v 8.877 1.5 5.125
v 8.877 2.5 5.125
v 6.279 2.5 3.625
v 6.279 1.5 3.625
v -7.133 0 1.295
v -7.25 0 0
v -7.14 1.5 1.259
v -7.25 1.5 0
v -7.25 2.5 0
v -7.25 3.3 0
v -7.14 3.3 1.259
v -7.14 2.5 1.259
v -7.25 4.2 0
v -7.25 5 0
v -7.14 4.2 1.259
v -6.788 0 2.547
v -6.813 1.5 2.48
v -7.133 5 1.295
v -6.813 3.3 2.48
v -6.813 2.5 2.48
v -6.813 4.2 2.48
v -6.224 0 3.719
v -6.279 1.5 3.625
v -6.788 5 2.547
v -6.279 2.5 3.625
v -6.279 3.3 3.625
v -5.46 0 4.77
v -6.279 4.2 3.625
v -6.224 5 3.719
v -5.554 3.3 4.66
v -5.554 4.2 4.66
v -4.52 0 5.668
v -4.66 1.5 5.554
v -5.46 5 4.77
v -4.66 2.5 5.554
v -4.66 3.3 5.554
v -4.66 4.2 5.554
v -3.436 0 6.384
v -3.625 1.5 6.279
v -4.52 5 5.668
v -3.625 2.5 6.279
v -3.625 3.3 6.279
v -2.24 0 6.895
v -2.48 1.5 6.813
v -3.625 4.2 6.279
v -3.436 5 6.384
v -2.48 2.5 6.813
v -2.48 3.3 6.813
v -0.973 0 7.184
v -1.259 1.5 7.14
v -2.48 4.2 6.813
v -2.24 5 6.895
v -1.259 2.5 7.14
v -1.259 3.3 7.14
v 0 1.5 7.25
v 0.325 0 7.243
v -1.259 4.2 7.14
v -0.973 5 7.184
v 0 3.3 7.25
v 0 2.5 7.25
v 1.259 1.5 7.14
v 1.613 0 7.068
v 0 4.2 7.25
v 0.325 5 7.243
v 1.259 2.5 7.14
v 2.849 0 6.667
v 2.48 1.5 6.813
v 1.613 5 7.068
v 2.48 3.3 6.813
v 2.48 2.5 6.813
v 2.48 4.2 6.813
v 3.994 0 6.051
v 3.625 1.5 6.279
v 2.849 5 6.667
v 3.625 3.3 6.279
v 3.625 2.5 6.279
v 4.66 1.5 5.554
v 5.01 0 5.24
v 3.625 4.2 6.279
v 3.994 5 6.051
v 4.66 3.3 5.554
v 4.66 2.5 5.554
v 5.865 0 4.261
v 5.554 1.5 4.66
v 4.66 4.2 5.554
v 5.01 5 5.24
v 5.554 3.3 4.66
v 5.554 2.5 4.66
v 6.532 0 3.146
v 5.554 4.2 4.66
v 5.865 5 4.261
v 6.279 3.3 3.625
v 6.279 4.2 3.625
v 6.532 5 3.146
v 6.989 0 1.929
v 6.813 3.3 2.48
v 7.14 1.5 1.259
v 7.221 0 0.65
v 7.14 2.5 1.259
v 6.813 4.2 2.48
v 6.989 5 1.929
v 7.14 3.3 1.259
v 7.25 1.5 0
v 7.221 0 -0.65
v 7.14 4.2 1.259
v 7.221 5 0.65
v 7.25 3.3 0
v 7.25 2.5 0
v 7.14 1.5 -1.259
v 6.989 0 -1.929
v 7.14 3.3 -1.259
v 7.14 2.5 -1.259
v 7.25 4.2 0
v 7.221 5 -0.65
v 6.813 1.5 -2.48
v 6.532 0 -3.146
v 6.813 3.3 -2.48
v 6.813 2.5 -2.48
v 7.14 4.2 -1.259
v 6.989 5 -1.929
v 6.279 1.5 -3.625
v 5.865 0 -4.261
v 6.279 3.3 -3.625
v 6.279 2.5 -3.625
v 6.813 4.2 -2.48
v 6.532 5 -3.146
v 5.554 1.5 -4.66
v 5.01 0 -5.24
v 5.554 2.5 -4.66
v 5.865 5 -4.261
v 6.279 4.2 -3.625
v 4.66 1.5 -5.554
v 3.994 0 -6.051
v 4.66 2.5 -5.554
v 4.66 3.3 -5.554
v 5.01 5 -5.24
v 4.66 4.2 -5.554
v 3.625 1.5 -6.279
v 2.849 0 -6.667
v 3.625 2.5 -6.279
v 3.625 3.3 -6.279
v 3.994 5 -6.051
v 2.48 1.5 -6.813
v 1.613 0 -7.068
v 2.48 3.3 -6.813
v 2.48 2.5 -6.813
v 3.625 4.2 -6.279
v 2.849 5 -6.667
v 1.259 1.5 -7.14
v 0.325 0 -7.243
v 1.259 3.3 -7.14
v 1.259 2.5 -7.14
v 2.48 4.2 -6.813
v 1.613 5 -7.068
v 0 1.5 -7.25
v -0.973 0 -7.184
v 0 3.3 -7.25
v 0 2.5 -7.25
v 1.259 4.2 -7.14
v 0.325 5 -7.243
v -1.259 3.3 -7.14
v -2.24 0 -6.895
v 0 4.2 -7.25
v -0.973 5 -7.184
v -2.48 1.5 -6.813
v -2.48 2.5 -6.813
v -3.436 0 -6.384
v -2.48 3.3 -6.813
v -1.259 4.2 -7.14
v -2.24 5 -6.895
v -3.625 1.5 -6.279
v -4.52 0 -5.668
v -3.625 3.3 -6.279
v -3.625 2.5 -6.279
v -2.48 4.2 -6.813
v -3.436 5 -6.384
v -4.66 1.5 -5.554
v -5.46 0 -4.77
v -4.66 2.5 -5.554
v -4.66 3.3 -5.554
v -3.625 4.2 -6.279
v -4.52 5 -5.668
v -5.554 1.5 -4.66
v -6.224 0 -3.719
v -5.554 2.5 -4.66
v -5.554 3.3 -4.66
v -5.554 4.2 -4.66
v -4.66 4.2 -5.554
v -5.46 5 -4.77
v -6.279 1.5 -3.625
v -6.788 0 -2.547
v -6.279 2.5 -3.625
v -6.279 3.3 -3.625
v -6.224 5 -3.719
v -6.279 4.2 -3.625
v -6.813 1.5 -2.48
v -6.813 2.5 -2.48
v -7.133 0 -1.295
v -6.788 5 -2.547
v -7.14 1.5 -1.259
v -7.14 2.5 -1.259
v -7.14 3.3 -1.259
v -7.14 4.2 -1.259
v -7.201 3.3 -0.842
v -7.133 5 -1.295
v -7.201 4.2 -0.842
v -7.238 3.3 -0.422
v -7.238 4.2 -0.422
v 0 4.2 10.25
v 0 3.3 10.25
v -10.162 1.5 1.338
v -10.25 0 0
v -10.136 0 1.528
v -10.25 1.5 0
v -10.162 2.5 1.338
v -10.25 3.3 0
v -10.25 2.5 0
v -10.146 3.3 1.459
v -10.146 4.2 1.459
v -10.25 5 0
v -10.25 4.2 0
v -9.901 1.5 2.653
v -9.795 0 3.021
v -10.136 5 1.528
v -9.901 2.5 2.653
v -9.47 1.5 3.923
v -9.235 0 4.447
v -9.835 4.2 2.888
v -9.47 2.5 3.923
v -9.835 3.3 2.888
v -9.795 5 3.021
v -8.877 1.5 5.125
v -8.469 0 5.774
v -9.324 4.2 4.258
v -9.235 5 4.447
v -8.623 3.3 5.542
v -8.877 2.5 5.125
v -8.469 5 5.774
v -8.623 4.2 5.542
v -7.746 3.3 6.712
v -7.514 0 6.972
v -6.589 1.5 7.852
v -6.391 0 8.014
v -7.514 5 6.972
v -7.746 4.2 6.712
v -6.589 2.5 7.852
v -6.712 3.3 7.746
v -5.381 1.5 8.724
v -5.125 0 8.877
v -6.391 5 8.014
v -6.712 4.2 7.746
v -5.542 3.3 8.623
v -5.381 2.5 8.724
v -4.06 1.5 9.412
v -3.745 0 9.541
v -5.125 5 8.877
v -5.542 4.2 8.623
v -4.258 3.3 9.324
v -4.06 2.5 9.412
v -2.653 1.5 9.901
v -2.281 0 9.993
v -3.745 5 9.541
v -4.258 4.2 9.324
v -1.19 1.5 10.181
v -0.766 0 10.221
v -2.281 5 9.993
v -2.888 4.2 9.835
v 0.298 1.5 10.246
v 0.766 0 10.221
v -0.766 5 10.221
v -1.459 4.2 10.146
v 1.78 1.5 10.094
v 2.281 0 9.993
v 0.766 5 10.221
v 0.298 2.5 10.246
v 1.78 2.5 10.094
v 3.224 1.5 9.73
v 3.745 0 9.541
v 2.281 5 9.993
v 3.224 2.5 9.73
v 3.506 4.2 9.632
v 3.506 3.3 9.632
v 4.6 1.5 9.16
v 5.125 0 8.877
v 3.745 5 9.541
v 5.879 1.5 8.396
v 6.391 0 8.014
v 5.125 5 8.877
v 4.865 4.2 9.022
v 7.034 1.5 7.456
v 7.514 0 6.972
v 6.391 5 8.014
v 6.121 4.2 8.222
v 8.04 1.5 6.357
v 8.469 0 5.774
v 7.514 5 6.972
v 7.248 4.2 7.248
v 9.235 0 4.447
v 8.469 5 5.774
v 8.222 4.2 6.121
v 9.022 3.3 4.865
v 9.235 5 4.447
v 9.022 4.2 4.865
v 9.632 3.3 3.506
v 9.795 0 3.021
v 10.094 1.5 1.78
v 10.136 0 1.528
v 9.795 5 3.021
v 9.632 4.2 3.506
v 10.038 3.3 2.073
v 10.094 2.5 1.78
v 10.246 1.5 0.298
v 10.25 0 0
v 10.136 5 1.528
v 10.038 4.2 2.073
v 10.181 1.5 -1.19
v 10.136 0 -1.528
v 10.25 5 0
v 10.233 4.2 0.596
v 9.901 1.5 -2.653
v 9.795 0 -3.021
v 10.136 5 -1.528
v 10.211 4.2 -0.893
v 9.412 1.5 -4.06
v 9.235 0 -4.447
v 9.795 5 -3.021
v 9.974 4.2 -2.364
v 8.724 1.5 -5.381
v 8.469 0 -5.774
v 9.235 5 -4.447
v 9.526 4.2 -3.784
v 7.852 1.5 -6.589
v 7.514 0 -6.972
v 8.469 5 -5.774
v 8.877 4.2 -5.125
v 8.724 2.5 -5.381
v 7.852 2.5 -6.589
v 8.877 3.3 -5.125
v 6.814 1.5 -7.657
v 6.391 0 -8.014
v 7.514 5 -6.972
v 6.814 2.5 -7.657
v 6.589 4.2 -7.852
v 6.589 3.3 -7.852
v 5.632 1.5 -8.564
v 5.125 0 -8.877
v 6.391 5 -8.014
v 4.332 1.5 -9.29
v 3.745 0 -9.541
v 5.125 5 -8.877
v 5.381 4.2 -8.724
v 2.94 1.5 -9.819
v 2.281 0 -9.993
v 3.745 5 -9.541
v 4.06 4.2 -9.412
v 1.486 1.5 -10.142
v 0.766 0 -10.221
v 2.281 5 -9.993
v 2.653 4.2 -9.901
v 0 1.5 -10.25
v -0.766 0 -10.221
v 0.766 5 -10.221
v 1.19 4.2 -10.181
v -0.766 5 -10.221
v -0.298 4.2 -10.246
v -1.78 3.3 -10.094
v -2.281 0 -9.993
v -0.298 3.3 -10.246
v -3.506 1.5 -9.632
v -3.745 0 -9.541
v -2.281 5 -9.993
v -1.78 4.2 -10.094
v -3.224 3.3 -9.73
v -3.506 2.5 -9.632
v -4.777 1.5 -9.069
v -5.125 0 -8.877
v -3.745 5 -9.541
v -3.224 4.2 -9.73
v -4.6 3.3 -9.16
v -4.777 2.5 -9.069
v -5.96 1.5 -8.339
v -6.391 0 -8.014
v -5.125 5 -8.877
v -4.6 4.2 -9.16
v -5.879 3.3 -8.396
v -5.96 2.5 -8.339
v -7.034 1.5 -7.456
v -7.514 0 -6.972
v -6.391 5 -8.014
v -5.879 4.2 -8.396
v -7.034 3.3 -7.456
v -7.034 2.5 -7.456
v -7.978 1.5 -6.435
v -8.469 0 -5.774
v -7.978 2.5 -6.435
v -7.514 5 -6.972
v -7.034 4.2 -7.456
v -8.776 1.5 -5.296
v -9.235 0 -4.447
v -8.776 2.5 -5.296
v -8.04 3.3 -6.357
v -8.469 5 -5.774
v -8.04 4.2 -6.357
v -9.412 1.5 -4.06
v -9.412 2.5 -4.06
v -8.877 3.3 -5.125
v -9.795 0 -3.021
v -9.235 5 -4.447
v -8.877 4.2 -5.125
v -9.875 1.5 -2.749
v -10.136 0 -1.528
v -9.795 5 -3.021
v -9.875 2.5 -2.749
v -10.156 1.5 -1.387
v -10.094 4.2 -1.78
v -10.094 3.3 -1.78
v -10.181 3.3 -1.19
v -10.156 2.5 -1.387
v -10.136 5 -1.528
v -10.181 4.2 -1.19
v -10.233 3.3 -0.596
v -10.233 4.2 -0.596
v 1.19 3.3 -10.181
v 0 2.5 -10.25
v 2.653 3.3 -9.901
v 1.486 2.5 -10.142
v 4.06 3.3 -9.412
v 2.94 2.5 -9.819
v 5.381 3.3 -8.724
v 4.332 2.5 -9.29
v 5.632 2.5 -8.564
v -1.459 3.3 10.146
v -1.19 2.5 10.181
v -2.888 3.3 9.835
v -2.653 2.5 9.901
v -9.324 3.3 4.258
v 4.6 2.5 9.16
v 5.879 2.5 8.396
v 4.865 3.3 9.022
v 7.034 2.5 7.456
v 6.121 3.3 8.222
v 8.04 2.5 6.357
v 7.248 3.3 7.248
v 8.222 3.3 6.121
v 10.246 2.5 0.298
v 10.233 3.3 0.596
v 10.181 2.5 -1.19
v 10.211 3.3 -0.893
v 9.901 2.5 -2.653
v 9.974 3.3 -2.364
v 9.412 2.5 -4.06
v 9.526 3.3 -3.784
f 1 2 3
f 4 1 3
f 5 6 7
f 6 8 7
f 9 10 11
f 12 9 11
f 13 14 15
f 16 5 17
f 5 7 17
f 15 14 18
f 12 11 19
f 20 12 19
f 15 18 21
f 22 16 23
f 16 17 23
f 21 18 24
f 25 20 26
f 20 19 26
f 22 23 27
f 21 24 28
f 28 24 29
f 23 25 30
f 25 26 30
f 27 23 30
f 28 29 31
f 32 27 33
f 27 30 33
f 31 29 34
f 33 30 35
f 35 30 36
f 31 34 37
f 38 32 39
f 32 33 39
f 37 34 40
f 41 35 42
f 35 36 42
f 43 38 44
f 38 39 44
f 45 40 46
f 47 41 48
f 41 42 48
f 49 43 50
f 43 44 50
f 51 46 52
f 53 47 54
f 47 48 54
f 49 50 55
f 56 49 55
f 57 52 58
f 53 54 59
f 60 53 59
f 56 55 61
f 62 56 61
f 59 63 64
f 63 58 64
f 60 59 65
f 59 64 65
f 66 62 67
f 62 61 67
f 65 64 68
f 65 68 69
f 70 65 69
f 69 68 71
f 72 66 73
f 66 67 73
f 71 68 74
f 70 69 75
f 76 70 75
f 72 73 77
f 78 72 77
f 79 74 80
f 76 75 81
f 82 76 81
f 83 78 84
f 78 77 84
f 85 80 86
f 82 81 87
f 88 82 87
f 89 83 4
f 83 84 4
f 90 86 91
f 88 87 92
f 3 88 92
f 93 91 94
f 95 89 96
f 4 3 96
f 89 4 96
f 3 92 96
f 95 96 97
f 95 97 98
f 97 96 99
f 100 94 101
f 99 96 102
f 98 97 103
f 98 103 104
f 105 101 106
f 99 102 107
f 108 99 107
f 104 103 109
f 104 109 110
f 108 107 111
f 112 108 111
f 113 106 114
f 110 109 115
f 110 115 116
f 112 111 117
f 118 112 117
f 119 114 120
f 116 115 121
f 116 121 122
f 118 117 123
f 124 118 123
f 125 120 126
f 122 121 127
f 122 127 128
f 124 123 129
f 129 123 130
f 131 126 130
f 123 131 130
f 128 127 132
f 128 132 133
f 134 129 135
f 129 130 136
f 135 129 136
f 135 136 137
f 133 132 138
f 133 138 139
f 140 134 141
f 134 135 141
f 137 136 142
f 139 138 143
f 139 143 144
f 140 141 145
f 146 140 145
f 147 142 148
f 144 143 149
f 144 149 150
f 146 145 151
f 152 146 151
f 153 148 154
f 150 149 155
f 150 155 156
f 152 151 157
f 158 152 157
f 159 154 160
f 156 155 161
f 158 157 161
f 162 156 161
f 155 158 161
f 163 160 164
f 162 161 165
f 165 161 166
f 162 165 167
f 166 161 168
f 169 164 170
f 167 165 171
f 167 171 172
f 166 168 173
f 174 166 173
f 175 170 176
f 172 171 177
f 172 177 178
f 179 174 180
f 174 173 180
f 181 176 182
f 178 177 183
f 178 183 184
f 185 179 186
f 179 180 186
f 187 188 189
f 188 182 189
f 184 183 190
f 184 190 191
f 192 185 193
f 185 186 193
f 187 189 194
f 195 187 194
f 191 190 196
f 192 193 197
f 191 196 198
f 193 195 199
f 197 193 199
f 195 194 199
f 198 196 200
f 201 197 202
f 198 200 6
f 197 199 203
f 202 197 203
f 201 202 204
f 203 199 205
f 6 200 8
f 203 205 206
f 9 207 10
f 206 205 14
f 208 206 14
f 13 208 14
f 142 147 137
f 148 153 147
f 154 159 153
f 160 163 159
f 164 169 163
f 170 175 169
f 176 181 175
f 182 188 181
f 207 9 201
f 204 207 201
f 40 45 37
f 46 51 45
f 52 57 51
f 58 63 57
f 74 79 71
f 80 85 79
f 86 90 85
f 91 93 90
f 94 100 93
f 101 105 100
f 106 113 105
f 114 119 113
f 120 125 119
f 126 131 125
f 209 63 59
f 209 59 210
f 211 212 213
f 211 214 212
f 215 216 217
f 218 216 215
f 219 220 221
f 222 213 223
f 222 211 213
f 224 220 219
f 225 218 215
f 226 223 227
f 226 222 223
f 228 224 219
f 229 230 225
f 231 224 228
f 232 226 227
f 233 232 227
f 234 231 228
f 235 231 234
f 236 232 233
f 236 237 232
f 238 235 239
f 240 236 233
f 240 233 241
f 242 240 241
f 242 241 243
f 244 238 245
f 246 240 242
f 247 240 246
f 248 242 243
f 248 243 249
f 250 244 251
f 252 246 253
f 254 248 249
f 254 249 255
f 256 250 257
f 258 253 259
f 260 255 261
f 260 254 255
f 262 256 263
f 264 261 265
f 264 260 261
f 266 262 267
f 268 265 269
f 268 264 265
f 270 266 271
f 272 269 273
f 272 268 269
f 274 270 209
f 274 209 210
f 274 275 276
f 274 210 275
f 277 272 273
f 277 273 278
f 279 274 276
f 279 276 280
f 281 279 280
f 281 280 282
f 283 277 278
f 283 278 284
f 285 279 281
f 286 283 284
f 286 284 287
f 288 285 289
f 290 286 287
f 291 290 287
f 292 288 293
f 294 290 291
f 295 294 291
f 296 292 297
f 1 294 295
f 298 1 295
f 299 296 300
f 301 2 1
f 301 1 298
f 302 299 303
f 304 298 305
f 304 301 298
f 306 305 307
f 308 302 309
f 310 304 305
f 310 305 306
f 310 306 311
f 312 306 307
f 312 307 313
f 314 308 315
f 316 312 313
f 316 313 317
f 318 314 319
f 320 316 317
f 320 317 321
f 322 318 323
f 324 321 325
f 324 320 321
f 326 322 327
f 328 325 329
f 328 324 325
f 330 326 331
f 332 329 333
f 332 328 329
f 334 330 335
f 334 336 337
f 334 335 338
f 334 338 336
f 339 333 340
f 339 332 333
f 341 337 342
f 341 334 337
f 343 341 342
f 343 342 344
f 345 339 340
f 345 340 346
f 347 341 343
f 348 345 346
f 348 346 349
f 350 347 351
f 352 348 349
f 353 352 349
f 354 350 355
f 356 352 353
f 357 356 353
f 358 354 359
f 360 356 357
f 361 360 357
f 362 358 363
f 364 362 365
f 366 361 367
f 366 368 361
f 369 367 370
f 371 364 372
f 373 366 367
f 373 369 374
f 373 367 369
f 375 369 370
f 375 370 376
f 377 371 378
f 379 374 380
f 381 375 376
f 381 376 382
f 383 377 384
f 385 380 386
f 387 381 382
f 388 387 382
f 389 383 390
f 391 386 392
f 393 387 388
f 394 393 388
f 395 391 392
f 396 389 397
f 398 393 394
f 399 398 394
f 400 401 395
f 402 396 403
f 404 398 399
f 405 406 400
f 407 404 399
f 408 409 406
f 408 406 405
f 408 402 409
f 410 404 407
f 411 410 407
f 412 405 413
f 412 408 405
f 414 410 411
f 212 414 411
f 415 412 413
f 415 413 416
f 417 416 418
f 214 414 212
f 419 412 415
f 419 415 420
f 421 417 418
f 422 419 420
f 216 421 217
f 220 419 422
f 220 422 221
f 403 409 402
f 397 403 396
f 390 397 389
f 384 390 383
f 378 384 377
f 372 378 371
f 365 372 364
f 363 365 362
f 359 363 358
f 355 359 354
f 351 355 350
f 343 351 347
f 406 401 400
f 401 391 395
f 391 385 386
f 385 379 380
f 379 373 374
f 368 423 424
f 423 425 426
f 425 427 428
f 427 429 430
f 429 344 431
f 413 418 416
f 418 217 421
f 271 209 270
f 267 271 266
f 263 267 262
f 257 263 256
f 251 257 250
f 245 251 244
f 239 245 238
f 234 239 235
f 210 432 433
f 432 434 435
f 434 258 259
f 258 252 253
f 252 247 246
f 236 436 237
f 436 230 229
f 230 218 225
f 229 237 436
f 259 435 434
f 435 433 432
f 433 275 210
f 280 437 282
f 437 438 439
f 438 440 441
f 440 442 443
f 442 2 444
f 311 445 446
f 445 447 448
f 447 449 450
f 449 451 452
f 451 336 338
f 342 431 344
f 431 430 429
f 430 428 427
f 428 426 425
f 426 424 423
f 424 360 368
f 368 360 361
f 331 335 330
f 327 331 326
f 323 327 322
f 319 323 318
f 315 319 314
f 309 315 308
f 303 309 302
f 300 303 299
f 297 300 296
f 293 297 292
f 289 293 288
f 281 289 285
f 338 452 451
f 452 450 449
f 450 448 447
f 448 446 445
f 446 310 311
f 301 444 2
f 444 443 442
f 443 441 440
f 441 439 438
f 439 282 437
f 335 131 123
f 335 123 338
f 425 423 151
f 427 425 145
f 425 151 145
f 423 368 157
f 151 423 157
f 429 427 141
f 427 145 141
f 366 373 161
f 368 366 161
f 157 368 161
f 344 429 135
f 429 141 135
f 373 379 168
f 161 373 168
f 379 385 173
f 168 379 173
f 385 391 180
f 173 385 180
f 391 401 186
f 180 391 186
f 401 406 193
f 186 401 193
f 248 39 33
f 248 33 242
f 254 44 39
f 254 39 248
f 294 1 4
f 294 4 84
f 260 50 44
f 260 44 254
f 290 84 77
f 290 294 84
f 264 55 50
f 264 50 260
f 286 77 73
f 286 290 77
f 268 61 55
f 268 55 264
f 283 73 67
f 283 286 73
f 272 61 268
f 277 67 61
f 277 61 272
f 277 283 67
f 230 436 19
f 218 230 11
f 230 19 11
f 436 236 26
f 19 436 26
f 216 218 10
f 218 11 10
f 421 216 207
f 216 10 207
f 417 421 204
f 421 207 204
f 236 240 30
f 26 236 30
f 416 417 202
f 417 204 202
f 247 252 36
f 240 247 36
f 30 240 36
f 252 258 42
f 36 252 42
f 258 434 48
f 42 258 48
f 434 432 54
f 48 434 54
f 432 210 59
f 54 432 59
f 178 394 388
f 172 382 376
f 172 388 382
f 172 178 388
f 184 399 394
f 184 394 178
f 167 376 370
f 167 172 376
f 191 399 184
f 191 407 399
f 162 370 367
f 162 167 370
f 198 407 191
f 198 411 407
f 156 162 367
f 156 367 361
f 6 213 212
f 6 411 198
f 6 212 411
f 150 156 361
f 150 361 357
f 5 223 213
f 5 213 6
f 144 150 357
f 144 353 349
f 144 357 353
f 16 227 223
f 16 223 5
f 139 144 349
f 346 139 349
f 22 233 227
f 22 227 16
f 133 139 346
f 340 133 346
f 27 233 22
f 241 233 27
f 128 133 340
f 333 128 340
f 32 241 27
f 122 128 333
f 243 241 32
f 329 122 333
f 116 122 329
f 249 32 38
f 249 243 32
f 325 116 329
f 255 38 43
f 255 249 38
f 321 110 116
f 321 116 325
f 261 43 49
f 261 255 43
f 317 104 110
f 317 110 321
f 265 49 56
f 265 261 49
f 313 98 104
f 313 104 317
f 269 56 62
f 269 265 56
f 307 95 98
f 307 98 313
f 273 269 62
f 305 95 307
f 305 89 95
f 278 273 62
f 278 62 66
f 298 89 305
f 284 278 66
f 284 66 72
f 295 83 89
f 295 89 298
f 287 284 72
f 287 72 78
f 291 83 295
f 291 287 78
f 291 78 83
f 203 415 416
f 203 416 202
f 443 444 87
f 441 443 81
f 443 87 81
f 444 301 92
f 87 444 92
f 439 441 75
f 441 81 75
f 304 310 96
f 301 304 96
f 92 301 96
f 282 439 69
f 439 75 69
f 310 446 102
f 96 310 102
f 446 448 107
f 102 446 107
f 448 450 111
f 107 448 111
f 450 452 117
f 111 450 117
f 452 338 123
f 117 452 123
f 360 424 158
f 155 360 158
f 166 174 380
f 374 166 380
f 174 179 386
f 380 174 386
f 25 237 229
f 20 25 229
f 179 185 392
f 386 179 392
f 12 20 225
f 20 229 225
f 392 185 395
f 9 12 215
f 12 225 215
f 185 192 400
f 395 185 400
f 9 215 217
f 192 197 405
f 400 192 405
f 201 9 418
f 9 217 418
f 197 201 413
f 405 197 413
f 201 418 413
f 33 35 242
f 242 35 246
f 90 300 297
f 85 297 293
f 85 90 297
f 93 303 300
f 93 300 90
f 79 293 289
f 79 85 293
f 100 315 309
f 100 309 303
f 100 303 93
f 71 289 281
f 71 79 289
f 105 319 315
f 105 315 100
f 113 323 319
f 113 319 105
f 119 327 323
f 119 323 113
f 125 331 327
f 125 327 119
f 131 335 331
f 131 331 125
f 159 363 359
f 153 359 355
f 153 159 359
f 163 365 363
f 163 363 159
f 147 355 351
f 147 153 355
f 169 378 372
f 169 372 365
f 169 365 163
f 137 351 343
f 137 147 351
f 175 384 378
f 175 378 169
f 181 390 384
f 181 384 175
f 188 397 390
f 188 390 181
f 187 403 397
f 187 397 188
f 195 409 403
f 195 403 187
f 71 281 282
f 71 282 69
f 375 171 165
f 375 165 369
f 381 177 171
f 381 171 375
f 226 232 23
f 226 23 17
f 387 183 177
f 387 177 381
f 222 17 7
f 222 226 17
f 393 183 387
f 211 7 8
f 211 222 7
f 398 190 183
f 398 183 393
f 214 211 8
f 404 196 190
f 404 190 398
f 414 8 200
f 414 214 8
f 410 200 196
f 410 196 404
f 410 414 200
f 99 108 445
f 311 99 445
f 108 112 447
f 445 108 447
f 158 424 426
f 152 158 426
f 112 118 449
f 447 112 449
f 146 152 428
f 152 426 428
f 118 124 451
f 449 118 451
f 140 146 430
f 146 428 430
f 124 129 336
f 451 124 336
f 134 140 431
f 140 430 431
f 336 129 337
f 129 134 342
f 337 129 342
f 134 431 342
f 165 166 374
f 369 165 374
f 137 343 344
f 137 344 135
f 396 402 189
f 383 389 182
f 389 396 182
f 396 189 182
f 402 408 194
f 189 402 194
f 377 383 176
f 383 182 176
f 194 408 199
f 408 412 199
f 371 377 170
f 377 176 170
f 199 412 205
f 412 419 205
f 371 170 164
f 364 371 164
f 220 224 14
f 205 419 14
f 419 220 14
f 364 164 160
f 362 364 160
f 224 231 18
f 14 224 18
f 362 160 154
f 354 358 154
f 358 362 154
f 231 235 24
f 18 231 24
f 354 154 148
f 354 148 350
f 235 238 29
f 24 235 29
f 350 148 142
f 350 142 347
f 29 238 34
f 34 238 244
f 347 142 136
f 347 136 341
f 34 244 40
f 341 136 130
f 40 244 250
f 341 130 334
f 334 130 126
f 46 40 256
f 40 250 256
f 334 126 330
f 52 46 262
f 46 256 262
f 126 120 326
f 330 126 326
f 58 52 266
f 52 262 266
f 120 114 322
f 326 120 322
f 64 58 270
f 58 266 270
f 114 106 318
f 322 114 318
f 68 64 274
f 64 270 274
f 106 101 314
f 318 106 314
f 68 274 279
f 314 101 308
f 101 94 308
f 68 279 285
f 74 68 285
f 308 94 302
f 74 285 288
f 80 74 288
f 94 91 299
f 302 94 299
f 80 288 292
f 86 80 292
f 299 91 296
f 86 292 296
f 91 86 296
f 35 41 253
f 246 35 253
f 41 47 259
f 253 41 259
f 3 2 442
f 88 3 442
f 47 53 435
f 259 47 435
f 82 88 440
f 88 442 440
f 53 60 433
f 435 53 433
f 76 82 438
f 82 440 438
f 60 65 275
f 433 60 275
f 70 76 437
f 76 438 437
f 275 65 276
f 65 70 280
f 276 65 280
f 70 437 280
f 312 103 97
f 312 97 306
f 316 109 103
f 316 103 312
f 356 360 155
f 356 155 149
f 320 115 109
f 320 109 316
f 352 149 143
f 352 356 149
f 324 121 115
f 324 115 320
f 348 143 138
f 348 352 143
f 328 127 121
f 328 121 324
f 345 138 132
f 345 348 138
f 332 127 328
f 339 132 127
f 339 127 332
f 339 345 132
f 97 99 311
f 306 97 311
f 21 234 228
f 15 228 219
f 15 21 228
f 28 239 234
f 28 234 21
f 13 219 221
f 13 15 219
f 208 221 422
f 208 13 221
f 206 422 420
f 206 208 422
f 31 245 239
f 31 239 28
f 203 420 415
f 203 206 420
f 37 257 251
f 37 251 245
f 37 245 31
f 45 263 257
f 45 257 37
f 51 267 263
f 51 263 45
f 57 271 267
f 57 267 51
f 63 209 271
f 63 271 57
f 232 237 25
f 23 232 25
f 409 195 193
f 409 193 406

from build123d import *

# Parameters (mm, degrees)
ESBO_O9_W             = 3
ESBO_O9_H             = 5
CORTE_EXTRUS_O1_START = 1
CORTE_EXTRUS_O1_DEPTH = 1
PADR_OCIRCULAR2_COUNT = 3
CORTE_EXTRUS_O3_START = 0.9
CORTE_EXTRUS_O3_DEPTH = 0.9
PADR_OCIRCULAR4_COUNT = 3


with BuildPart() as part:
    # Esboço9 → Revolução1 (revolve)
    with BuildSketch(Plane.XY, mode=Mode.PRIVATE) as revolu_o1_sk:
        with Locations((8.75, 2.5)):
            Rectangle(ESBO_O9_W, ESBO_O9_H)
    revolve(revolu_o1_sk.sketch.rotate(Axis((0, -112.760074913, 0), (0, 1, 0)), 180), axis=Axis((0, -112.760074913, 0), (0, 1, 0)))

    # Esboço12 → Corte-extrusão1 (cut)
    with BuildSketch(Plane(origin=(0, 1.5, 0), x_dir=(1, 0, 0), z_dir=(0, 1, 0)).offset(CORTE_EXTRUS_O1_START)):
        with BuildLine():
            Line((0, 10.25), (0, 5.5))
            ThreePointArc((0, 5.5), (4.213244437, 3.535331853), (5.416442642, -0.955064977))
            Line((5.416442642, -0.955064977), (10.094279468, -1.779893821))
            ThreePointArc((10.094279468, -1.779893821), (7.851955542, 6.588572999), (0, 10.25))
        make_face()
    corte_extrus_o1 = extrude(amount=-CORTE_EXTRUS_O1_DEPTH, mode=Mode.SUBTRACT)

    # PadrãoCircular2: Corte-extrusão1 ×3 about axis
    padr_ocircular2_axis = Axis((0, 0, 0), (0, 1, 0))
    for i in range(1, PADR_OCIRCULAR2_COUNT):
        add(corte_extrus_o1.rotate(padr_ocircular2_axis, i * 360 / PADR_OCIRCULAR2_COUNT), mode=Mode.SUBTRACT)

    # Esboço13 → Corte-extrusão3 (cut)
    with BuildSketch(Plane(origin=(0, 3.3, 0), x_dir=(1, 0, 0), z_dir=(0, 1, 0)).offset(CORTE_EXTRUS_O3_START)):
        with BuildLine():
            Line((0, 0), (8.876760389, 5.125))
            ThreePointArc((8.876760389, 5.125), (9.631849363, -3.505706469), (3.505706469, -9.631849363))
            Line((3.505706469, -9.631849363), (0, 0))
        make_face()
    corte_extrus_o3 = extrude(amount=-CORTE_EXTRUS_O3_DEPTH, mode=Mode.SUBTRACT)

    # PadrãoCircular4: Corte-extrusão3 ×3 about axis
    padr_ocircular4_axis = Axis((0, 0, 0), (0, 1, 0))
    for i in range(1, PADR_OCIRCULAR4_COUNT):
        add(corte_extrus_o3.rotate(padr_ocircular4_axis, i * 360 / PADR_OCIRCULAR4_COUNT), mode=Mode.SUBTRACT)


solid = part.part
